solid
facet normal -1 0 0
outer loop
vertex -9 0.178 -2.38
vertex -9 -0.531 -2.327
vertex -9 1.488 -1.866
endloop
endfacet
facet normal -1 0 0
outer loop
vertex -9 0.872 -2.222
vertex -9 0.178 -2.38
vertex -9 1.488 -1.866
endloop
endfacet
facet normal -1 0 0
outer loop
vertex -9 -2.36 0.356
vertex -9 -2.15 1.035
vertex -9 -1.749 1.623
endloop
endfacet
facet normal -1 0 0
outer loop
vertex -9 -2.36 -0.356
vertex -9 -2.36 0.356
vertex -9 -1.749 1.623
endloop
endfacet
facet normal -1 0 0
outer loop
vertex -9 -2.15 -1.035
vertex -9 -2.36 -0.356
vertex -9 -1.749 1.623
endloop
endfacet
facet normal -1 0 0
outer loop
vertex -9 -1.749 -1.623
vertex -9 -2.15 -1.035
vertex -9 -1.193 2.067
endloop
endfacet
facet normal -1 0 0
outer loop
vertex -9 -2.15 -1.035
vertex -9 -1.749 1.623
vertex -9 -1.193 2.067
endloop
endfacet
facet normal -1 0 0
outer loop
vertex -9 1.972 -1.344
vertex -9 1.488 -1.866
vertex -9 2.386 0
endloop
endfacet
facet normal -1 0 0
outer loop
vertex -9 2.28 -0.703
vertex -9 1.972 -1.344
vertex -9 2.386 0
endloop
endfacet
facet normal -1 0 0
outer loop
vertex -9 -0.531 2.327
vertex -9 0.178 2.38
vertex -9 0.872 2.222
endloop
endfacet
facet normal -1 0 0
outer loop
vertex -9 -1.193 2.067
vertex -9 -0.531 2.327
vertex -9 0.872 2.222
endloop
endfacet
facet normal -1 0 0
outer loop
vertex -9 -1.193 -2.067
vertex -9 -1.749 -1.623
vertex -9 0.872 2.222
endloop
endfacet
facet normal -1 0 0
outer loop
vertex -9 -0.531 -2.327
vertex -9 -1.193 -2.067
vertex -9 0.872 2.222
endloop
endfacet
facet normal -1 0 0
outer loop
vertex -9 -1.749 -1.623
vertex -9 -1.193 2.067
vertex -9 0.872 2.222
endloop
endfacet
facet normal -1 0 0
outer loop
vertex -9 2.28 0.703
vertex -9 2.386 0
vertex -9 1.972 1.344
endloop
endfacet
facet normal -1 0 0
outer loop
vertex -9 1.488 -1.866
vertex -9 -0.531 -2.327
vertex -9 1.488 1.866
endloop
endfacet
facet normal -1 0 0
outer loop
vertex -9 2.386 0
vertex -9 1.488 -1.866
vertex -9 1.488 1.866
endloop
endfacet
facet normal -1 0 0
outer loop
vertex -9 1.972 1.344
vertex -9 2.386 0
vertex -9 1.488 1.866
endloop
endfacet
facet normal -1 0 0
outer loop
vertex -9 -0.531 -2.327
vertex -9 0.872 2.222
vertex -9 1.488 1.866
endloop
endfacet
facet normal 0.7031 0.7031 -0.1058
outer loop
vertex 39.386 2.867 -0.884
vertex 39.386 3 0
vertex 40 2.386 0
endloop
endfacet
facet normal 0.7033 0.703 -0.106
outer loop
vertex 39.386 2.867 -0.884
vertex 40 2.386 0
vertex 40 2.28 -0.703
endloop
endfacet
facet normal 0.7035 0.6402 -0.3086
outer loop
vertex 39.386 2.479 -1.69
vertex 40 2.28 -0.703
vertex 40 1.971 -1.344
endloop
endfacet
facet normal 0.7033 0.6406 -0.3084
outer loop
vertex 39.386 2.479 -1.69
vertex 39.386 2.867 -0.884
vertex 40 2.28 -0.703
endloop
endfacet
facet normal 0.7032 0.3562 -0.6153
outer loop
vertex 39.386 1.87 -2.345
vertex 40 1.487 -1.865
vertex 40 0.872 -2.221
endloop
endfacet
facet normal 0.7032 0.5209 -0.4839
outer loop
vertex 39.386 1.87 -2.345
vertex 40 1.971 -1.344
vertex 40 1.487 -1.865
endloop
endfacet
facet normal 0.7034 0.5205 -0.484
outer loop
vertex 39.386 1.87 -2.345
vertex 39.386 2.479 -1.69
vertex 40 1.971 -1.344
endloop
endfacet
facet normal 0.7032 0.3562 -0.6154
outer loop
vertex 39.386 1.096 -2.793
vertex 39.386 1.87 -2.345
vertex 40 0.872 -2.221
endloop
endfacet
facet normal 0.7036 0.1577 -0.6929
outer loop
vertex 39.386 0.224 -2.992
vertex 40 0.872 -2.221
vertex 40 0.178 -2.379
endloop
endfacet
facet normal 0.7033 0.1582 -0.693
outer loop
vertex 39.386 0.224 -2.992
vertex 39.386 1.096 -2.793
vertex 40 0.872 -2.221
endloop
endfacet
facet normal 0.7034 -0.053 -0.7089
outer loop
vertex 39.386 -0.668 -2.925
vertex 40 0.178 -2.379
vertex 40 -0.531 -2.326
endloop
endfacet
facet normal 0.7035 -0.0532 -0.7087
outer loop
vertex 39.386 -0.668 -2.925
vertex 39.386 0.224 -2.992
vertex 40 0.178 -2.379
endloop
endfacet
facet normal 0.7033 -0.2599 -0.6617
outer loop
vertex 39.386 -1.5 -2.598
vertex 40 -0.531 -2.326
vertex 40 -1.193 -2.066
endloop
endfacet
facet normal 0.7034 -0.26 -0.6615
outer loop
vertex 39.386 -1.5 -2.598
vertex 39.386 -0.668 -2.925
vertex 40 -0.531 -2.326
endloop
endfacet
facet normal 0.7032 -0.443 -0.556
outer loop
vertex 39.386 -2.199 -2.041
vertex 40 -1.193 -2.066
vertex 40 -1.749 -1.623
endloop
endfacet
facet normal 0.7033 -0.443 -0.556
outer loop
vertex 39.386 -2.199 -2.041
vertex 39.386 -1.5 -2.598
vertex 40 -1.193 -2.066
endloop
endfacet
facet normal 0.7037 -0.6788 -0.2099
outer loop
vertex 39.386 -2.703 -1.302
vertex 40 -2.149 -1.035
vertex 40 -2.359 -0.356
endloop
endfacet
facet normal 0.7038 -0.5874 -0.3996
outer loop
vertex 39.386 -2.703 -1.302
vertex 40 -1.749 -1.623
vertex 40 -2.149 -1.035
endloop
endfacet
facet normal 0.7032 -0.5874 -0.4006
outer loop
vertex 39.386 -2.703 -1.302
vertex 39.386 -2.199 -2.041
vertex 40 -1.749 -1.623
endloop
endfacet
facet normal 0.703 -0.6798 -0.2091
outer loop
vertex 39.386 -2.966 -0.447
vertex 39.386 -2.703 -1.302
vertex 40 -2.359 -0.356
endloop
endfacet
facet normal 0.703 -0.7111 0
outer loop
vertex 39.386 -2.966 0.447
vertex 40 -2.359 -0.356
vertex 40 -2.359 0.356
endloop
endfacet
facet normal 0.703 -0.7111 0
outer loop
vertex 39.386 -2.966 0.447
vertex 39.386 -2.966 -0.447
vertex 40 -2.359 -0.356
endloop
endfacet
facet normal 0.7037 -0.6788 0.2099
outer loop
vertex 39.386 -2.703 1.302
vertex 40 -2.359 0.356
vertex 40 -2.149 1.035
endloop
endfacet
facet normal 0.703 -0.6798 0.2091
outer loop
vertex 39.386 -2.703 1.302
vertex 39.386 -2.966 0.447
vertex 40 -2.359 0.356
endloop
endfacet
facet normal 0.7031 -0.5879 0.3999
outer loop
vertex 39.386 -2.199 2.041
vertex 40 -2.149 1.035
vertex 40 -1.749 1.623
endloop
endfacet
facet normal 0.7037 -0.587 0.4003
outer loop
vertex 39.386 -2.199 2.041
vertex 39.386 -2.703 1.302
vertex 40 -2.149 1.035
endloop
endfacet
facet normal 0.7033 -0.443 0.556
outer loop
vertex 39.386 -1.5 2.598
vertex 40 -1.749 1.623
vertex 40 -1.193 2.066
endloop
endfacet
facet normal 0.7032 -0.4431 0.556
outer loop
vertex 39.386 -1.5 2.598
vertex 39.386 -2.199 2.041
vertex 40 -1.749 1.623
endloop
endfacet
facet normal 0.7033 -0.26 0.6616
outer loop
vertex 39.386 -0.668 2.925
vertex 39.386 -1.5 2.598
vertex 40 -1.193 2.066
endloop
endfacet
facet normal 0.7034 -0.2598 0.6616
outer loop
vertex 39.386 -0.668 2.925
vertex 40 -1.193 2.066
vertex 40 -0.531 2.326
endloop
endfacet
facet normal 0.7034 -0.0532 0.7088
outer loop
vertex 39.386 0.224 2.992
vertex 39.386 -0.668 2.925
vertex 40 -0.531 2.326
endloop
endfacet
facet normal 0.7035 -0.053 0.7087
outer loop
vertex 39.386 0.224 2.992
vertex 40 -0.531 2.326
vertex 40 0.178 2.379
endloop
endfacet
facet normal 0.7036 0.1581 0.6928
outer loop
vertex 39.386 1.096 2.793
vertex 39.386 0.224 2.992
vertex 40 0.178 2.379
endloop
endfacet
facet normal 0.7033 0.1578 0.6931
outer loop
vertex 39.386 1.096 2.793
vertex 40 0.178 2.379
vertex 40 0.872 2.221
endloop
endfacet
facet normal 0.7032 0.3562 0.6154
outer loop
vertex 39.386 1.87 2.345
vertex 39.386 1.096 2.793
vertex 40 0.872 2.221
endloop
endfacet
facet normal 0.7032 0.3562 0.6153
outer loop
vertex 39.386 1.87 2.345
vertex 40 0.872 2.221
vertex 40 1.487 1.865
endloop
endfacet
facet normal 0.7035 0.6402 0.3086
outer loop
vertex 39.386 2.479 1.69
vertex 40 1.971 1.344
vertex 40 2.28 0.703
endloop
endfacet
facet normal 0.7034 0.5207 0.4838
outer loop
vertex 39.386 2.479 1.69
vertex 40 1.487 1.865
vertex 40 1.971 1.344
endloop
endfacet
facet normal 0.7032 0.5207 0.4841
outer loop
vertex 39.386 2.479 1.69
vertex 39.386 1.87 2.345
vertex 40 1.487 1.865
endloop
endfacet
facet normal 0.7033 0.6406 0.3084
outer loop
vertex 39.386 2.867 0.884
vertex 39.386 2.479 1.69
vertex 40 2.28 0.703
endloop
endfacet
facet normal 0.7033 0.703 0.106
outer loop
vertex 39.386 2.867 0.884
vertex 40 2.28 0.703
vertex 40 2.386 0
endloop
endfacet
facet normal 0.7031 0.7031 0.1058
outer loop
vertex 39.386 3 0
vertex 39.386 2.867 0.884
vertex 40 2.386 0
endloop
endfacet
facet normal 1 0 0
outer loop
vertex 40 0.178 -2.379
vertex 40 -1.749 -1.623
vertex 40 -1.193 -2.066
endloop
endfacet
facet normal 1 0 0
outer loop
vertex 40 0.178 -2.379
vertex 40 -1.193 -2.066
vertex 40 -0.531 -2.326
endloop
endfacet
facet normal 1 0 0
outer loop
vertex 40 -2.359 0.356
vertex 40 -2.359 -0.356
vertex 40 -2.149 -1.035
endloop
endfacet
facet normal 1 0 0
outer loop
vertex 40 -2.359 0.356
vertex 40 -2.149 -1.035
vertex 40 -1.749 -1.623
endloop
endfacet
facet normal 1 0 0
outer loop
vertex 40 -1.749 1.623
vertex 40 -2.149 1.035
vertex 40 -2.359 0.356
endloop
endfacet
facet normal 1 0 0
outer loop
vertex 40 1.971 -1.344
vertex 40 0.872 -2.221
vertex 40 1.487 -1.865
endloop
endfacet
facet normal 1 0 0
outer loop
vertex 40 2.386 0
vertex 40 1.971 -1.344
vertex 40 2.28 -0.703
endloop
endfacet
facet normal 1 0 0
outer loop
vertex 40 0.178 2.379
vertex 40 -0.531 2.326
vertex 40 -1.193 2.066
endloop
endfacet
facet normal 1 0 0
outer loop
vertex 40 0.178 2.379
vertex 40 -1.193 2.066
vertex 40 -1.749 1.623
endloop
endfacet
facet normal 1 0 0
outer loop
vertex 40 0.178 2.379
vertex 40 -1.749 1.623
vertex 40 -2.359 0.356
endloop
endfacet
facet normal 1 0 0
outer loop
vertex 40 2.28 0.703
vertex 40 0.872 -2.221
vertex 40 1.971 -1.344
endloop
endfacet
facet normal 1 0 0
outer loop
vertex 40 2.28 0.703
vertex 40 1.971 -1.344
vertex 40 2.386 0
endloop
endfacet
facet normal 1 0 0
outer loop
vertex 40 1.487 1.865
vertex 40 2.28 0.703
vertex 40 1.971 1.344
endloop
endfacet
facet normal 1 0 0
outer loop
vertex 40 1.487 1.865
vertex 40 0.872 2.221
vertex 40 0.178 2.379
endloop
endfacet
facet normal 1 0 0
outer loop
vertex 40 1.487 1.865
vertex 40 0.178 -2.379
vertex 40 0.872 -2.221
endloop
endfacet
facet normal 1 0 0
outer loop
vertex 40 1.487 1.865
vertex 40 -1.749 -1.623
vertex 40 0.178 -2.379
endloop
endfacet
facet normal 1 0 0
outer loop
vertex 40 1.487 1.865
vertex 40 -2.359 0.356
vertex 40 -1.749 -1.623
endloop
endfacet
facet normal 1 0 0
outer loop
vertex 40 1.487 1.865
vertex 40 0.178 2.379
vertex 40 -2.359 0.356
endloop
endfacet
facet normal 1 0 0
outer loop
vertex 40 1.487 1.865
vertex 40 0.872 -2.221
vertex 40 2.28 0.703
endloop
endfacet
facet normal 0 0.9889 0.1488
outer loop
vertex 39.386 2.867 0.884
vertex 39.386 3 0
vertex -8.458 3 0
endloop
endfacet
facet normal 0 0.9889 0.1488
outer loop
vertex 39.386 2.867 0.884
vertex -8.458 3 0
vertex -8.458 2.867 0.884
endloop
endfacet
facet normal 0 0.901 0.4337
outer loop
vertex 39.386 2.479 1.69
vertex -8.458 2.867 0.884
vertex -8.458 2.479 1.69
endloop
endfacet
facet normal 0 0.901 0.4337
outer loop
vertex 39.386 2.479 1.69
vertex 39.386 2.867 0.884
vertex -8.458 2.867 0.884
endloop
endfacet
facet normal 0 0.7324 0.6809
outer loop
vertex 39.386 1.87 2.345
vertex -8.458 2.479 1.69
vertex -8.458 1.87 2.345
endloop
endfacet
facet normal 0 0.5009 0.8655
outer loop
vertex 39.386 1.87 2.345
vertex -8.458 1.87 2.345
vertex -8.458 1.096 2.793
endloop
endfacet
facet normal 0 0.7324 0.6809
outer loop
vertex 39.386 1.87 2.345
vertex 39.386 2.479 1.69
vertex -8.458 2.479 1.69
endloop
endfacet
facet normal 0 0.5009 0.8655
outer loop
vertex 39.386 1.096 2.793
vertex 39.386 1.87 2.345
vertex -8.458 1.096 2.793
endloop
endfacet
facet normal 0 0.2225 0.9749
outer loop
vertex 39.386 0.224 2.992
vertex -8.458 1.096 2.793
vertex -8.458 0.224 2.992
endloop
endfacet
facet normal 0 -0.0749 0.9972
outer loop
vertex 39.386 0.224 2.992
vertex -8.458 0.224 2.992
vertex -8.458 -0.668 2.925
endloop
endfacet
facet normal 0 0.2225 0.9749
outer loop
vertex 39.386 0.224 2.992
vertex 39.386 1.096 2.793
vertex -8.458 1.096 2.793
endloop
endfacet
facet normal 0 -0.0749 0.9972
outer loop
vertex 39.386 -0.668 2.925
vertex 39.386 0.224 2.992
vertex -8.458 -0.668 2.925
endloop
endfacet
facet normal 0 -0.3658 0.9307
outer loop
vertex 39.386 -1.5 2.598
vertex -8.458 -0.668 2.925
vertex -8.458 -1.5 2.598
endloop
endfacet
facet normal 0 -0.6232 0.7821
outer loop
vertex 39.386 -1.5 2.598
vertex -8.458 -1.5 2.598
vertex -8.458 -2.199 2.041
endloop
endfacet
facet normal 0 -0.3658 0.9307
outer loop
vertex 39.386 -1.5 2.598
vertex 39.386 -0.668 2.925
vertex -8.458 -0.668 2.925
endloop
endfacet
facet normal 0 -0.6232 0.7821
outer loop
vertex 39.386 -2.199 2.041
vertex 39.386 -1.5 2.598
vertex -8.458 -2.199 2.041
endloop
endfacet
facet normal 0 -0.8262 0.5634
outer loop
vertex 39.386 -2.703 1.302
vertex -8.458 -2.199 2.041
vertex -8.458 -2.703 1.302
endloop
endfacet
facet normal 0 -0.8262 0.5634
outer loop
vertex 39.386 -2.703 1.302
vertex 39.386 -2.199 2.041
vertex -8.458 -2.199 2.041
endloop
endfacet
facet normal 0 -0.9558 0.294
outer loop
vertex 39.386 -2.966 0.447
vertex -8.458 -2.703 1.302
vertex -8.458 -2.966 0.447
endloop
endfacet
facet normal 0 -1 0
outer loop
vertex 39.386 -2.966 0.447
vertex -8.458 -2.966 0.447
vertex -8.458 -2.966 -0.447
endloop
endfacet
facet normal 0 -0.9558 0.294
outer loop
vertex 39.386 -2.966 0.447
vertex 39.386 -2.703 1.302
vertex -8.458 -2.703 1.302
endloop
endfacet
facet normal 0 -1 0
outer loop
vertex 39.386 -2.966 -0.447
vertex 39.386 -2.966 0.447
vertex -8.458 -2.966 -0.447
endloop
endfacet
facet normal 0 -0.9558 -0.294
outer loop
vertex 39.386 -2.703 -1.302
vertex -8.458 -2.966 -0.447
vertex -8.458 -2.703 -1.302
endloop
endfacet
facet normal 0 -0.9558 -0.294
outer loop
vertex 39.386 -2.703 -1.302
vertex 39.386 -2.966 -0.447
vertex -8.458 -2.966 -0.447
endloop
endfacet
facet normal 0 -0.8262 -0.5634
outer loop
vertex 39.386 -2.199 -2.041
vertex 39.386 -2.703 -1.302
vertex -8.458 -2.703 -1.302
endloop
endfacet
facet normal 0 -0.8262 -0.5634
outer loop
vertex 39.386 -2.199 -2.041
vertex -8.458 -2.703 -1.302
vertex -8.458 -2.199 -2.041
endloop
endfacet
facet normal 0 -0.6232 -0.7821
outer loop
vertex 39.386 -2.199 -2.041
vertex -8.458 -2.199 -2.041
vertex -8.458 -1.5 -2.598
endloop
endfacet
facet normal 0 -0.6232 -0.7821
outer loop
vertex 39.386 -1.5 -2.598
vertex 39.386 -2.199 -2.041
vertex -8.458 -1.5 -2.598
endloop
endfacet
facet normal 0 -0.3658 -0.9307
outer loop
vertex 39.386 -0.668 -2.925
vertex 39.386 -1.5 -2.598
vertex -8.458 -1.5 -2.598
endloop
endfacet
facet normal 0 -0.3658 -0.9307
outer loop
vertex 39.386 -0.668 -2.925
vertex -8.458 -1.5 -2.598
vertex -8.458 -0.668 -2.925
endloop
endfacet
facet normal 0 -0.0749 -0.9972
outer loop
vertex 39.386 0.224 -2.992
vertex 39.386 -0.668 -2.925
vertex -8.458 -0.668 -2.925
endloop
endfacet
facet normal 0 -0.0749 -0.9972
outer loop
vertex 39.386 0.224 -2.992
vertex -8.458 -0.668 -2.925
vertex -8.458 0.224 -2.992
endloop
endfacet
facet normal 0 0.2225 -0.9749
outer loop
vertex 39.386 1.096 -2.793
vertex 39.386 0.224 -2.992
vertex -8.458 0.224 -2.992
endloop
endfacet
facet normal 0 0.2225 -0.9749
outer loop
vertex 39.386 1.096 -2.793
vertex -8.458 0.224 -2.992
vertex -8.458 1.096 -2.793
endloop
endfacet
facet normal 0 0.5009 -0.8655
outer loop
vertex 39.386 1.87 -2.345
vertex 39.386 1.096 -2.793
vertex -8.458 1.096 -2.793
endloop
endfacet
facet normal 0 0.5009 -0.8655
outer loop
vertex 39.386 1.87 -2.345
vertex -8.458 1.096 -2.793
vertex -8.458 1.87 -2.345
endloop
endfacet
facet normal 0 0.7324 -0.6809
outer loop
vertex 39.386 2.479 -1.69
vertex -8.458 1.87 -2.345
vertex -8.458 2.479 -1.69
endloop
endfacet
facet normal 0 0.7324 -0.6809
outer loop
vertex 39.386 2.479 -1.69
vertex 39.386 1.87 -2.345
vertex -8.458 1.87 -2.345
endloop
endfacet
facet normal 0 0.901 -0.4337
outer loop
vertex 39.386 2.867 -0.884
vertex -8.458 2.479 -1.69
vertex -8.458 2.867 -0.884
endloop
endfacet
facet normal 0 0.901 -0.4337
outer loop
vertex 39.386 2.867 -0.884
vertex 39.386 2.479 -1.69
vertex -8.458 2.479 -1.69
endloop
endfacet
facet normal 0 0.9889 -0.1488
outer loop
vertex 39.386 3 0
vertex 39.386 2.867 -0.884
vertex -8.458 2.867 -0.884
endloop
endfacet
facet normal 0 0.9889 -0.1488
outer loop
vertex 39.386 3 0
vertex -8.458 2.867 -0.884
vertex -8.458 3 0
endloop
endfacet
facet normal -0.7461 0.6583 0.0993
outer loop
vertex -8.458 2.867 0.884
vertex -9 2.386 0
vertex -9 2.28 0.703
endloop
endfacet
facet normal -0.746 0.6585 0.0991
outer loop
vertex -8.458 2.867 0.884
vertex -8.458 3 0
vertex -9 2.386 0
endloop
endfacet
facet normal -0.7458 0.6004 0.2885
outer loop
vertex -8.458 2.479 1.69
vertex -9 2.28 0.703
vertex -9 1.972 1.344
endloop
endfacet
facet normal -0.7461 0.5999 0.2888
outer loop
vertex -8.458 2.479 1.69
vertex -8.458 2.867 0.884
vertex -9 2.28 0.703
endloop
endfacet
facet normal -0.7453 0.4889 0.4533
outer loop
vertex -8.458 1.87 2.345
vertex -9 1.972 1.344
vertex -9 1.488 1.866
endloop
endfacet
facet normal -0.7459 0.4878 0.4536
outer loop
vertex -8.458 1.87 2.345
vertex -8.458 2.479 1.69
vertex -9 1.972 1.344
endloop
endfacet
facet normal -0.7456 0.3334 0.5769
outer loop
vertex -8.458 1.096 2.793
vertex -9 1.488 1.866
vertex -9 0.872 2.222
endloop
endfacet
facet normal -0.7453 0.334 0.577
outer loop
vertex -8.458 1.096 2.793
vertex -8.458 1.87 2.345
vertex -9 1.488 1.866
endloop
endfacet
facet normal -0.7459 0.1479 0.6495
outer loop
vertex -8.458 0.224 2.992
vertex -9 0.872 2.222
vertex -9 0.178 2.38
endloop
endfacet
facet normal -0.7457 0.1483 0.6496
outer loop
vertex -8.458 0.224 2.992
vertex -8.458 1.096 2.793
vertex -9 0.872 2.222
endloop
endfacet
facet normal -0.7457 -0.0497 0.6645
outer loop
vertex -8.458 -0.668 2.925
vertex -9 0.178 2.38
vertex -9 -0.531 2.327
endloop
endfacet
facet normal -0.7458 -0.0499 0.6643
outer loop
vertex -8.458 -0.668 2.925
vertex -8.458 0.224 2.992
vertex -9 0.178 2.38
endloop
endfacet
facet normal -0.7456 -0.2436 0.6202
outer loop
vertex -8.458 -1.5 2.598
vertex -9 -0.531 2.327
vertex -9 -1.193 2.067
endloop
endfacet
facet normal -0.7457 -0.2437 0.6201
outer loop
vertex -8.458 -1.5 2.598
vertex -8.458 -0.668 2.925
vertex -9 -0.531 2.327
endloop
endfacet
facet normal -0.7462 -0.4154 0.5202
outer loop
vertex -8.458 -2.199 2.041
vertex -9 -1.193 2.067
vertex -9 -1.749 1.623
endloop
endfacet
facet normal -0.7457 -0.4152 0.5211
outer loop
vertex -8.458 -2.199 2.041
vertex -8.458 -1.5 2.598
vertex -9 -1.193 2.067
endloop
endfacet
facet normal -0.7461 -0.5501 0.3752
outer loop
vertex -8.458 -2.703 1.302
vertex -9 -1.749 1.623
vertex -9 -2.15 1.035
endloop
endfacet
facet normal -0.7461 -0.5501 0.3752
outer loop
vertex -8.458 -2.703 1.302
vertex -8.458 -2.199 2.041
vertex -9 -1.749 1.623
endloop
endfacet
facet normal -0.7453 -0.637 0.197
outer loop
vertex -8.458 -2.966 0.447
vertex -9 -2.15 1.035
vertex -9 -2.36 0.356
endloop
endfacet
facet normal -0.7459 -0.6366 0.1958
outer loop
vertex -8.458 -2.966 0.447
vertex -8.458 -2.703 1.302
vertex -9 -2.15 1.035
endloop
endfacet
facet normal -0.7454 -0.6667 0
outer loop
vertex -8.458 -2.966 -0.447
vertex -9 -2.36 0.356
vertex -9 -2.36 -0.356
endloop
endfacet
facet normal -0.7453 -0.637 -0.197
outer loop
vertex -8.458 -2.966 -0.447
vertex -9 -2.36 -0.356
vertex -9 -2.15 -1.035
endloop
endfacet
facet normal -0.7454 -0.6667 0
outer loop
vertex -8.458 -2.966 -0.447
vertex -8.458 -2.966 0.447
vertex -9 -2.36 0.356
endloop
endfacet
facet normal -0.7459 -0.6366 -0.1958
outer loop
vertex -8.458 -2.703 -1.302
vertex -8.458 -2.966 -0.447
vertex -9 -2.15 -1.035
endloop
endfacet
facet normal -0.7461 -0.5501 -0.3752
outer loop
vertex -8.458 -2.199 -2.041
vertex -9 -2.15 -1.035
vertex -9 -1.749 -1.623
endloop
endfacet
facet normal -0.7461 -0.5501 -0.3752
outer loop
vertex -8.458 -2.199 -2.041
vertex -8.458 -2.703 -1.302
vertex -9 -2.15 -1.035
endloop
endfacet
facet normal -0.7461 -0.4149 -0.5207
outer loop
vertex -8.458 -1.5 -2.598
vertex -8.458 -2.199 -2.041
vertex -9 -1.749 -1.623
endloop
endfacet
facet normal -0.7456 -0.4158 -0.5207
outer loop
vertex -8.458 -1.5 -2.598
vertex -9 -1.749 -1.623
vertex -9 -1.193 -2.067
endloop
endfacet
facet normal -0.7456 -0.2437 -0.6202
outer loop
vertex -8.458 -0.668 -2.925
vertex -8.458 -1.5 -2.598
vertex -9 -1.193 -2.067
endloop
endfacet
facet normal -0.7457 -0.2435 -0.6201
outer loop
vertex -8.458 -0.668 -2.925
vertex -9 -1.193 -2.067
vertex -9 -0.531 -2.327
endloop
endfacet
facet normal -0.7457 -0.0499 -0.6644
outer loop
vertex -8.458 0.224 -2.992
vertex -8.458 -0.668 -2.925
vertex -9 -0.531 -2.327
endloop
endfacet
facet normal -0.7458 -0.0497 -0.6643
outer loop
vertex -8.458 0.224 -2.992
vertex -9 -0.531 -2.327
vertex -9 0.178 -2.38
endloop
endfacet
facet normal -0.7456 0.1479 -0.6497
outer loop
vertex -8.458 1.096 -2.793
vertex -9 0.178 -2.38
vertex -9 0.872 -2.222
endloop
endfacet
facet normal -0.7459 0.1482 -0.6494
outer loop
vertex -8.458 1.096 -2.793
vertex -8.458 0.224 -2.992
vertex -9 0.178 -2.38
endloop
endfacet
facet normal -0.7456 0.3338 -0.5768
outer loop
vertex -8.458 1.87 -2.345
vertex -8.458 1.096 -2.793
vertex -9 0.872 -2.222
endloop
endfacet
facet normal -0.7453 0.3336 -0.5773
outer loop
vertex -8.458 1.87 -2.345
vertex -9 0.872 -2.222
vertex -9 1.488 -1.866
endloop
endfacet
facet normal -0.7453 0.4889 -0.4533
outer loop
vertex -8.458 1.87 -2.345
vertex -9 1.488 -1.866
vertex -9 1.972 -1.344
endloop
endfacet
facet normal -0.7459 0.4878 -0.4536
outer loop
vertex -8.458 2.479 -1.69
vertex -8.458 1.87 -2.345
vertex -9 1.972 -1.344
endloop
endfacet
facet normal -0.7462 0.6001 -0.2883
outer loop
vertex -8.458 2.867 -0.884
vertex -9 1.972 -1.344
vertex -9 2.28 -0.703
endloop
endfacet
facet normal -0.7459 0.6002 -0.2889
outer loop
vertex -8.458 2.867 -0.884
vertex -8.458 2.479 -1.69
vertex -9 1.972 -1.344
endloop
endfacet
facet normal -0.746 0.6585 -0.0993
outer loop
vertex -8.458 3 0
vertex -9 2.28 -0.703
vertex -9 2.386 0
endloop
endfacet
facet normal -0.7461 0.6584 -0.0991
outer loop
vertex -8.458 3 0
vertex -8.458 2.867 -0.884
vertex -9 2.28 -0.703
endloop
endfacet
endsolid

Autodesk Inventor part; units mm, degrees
ref_plane "YZ Plane" through (0, 0, 0) normal (1, 0, 0) x (0, 1, 0)
ref_plane "XZ Plane" through (0, 0, 0) normal (0, 1, 0) x (-1, 0, 0)
sketch "Schizzo1" plane through (0, 0, 0) normal (0, 0, 1) x (1, 0, 0)
  line L0 (40, 3) -> (40, 0)
  line L1 (-9, 0) -> (40, 0)
  line L2 (-18.8, 0) -> (49.8, 0) projected
  line L3 (0, 3.6) -> (0, -0.6) projected
  line L4 (-9, 3) -> (-9, 0)
  line L5 (22, 3) -> (22, 0) construction
  line L6 (-18.8, 0) -> (49.8, 0) projected
  line L7 (-9, 3) -> (40, 3)
  dimension "d4" = 9
  dimension "d5" = 40
  dimension "d6" = 18
  dimension "d13" = 6
revolve "Corpo" add sketch "Schizzo1" angle 360 about axis through (-9, 0, 0) along (1, 0, 0)
thread "Filettatura1" size "M6x1" class "6g" standard "ISO Metric profile" length 9
thread "Filettatura2" size "M6x1" class "6g" standard "ISO Metric profile" length 18.6135
chamfer "Smusso1" distance 0.6145 distance2 0.6135 1 edges at (40, -3, 0) measured on face at (40, 1.0659, 1.0214)
chamfer "Smusso2" distance 0.5423 distance2 0.6135 1 edges at (-9, -3, 0) measured on face at (23.2577, 2.9903, -0.2414)
ref_plane "Work Plane1" through (2.75, 0, 0) normal (0, -1, 0) x (1, 0, 0)
equation "\"d4\" = KOH"
equation "\"d5\" = NLG"
equation "\"d6\" = GEL"
equation "\"d13\" = GD"
equation "\"d1\" = KOH"
equation "\"d7\" = GEL + GAL"
equation "\"d10\" = -0.5 * SPD + 0.5 * GD"
equation "\"d12\" = -0.5 * SPD + 0.5 * GD"
equation "\"NLG\" = 40"
equation "\"GEL\" = 18"
equation "\"GAL\" = 0.61345 * PTC"
equation "\"SPD\" = NND - 1.2269 * PTC"
equation "\"d0\" = GD"
equation "\"GUL\" = 0.61345 * PTC"
equation "\"KOH\" = 9"
equation "\"GD\" = NND"
equation "\"BDM\" = NND"
equation "\"GUL1\" = 0.54127"
equation "\"GAL1\" = 1"
equation "\"d80\" = -GUL - GEL"
equation "\"d86\" = -KOH + GUL1"
equation "\"PTC\" = 1"
equation "\"THREADDIA\" = 6"
equation "\"TOA\" = 30deg"
equation "\"NND\" = 6"
equation "\"GD1\" = THREADDIA - 1.2269 * PTC"
properties part number "UNI 5909 - M6 x 40" material "Acciaio, Dolce"
